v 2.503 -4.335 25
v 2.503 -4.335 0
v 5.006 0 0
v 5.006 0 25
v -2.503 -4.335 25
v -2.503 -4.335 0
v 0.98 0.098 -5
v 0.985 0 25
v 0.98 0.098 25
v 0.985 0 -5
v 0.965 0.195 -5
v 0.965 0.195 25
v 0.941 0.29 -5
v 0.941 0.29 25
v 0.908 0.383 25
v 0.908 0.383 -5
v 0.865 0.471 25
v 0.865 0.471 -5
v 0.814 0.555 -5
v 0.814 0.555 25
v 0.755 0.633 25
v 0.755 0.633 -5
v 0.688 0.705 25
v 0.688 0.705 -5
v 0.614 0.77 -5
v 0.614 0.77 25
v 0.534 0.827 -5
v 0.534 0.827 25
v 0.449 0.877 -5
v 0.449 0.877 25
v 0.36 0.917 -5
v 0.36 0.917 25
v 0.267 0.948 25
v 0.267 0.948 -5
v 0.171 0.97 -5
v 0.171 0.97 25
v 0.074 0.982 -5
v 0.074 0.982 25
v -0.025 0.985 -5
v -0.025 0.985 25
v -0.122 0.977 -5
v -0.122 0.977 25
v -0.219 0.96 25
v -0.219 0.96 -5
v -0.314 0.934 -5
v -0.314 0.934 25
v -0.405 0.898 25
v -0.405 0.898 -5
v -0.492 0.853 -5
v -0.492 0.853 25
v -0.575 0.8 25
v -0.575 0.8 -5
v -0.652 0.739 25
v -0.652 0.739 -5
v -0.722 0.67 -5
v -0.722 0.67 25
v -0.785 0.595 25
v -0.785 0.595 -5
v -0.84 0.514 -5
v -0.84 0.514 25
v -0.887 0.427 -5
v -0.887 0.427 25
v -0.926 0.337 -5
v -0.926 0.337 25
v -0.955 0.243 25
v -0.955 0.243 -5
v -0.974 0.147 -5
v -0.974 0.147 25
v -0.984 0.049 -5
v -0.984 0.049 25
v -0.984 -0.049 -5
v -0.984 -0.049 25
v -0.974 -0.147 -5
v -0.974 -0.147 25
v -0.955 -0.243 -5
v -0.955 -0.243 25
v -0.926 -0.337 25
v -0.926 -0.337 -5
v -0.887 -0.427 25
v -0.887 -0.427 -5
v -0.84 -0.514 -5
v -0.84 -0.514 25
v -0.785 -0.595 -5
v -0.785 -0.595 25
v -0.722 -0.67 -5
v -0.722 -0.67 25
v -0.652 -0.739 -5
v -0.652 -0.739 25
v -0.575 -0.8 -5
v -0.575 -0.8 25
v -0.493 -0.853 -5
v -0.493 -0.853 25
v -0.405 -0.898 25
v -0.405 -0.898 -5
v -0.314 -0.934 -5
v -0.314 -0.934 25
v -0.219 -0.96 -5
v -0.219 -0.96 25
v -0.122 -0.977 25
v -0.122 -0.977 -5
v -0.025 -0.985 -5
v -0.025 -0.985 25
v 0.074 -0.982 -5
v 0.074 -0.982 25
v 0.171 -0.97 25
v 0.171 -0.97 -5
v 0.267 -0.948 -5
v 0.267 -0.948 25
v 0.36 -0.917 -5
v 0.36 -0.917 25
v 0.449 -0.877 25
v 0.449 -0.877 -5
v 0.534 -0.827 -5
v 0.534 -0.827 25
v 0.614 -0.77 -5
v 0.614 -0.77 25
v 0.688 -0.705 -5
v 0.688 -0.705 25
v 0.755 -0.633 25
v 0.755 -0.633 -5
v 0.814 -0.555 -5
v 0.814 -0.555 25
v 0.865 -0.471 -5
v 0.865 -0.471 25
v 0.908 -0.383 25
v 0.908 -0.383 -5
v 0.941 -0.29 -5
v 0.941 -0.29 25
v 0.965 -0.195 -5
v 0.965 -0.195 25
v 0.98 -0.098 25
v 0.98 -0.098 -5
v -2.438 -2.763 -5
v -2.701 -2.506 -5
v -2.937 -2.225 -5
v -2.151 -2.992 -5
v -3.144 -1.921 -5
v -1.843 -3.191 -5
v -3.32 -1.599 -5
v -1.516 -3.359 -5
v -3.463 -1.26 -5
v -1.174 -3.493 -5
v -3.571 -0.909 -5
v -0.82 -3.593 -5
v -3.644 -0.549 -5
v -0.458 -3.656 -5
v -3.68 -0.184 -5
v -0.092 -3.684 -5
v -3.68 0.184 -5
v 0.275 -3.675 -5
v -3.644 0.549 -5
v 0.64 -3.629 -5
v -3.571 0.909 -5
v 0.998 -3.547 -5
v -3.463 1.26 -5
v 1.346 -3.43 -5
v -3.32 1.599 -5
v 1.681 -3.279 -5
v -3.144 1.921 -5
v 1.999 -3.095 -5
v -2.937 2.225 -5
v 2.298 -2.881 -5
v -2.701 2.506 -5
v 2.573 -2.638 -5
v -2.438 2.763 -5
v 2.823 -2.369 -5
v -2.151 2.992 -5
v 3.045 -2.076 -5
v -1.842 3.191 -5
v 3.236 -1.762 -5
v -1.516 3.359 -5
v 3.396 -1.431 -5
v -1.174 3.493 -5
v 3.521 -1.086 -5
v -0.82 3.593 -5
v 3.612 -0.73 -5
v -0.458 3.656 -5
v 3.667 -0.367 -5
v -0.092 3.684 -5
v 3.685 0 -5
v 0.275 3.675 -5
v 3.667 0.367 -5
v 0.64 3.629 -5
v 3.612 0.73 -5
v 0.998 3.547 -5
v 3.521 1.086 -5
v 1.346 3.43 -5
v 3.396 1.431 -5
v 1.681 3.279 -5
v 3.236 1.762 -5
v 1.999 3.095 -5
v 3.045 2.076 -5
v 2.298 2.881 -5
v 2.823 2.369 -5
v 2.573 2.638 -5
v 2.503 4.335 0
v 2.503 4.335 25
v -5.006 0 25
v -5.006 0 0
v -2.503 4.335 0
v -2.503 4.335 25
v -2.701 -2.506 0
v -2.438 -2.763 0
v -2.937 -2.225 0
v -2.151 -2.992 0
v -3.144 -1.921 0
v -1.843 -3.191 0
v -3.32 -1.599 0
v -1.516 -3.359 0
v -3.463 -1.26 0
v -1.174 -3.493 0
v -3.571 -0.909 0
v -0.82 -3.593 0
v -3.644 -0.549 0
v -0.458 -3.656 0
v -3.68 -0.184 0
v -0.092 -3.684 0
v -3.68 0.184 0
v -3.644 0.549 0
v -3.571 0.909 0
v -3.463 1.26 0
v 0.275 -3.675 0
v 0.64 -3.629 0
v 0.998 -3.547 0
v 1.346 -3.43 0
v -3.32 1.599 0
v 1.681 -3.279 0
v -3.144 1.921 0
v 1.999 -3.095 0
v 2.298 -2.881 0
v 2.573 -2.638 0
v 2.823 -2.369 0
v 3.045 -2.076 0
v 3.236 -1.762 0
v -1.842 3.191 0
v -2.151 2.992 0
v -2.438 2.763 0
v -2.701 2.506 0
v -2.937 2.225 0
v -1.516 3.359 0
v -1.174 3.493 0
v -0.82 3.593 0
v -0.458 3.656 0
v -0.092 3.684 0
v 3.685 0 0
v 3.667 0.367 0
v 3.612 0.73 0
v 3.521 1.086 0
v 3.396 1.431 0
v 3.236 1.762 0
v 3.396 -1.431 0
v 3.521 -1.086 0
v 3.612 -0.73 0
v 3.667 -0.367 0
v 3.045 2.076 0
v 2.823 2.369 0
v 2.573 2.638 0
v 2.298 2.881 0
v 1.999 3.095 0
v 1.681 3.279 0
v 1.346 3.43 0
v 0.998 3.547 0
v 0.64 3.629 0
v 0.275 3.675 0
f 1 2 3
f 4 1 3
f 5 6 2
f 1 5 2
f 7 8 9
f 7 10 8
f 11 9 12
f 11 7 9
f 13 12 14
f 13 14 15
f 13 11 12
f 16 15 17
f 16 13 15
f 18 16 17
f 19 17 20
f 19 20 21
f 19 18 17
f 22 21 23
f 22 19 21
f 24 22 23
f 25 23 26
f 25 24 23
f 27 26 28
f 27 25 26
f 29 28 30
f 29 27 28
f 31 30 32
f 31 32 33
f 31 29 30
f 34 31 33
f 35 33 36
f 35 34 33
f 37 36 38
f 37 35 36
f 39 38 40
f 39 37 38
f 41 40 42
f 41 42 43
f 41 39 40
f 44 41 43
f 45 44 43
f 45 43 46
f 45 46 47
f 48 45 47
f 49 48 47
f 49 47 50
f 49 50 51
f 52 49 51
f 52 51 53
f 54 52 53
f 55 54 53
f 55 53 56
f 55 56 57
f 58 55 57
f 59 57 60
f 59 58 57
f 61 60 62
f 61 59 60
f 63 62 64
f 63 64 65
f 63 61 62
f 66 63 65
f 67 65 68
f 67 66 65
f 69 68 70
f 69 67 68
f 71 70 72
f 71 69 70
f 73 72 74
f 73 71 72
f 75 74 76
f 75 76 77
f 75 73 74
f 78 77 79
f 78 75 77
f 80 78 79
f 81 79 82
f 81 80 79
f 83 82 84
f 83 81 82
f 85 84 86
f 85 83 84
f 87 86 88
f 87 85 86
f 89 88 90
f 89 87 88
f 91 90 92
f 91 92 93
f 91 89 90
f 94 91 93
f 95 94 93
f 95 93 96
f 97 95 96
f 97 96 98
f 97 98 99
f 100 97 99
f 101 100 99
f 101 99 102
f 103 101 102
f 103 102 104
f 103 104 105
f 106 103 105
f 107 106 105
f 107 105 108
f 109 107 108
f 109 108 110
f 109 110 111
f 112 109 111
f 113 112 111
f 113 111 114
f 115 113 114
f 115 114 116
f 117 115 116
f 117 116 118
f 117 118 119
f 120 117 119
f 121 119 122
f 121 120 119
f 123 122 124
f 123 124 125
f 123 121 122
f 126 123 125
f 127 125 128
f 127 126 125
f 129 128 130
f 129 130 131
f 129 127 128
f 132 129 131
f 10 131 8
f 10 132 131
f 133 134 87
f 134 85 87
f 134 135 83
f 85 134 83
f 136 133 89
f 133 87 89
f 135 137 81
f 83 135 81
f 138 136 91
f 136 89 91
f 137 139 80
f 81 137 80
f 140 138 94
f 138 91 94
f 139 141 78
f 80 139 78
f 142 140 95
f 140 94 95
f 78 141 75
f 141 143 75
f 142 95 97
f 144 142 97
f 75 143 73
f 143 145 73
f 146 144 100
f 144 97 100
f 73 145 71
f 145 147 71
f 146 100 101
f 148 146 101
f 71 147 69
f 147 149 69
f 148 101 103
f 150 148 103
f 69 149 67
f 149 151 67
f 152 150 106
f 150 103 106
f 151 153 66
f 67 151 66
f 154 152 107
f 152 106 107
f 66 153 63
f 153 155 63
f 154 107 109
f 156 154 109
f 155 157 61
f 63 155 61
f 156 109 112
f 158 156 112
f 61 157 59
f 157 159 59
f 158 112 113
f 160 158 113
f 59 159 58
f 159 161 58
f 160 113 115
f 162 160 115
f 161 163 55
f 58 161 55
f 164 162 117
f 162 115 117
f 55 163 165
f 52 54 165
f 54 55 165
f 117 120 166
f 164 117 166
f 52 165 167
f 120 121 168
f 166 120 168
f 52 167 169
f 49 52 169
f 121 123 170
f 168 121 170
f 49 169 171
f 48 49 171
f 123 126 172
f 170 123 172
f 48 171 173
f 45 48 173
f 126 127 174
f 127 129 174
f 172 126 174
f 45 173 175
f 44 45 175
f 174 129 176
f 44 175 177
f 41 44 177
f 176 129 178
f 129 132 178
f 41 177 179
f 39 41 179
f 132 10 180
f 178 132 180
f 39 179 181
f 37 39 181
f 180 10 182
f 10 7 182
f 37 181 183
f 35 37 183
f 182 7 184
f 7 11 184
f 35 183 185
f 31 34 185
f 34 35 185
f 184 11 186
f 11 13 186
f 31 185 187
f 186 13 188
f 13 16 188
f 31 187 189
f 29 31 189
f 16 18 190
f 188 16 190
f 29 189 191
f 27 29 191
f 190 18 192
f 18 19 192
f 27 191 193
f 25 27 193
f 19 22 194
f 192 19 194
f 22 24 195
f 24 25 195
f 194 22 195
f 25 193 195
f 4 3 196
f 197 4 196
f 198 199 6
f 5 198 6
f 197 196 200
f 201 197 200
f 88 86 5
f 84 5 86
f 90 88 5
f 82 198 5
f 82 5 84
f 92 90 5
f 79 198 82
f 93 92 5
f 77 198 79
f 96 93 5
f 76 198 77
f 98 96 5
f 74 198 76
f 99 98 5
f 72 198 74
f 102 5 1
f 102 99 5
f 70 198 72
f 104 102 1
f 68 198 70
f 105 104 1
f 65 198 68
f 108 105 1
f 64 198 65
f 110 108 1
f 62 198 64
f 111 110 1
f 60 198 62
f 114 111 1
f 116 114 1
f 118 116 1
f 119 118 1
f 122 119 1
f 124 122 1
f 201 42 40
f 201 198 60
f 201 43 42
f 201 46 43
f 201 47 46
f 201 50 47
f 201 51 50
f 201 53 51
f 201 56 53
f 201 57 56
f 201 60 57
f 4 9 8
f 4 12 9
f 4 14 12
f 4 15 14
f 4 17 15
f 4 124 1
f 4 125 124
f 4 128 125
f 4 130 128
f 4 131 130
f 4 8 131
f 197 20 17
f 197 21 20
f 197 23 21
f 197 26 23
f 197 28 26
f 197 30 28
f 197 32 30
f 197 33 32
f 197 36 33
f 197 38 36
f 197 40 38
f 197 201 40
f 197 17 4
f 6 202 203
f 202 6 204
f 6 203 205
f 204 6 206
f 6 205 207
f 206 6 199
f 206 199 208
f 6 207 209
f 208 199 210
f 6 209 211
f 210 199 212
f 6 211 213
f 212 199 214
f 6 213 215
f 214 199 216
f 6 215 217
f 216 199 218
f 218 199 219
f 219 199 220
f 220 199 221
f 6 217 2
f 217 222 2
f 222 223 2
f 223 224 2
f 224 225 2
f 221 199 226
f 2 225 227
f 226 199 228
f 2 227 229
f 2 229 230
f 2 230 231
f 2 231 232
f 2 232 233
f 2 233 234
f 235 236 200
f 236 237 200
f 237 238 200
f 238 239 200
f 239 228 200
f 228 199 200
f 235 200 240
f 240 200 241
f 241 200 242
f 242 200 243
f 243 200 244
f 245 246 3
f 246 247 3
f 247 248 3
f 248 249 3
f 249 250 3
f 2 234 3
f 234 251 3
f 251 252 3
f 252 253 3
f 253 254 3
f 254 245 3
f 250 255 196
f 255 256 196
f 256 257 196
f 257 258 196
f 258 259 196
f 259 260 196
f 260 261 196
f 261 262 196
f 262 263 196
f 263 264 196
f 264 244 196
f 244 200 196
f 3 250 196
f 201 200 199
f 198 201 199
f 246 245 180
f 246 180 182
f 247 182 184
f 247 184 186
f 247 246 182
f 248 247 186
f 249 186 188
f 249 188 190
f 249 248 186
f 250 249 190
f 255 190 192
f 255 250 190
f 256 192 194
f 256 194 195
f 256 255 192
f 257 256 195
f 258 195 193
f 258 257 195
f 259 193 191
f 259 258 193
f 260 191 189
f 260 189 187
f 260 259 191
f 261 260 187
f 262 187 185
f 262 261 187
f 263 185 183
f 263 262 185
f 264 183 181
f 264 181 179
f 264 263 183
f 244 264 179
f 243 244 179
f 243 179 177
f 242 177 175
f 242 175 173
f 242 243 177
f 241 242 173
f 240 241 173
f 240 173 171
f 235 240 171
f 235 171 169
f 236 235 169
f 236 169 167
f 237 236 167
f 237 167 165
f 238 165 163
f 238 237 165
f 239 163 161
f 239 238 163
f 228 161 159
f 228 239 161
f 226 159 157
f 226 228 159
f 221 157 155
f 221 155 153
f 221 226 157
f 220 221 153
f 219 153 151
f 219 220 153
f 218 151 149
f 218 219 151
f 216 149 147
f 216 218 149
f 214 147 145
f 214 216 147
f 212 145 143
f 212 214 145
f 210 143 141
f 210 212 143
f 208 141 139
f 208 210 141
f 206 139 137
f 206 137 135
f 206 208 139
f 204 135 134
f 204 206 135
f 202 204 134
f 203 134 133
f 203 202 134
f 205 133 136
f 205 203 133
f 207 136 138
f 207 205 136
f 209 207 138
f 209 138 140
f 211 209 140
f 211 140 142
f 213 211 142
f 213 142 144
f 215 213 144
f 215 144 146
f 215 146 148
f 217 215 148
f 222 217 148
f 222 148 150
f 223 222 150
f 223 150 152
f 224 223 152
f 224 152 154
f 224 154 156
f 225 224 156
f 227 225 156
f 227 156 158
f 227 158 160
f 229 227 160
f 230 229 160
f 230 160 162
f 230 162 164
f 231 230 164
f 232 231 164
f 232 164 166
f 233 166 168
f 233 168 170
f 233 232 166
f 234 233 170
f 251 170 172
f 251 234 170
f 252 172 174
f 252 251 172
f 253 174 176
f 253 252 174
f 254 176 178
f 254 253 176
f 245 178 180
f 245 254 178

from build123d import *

# Parameters (mm, degrees)
F0_R        = 3.685
F0_R_2      = 0.985
F1_DEPTH    = 5
F1_FACE_R   = 3.685
F1_FACE_R_2 = 0.985
F2_DEPTH    = 25


with BuildPart() as f1:
    # F0 (on Top) → F1 (new body)
    with BuildSketch(Plane.XY):
        Circle(F0_R)
        Circle(F0_R_2, mode=Mode.SUBTRACT)
    extrude(amount=-F1_DEPTH)

    # F0 (on Top) + F1_face (on face) → F2 (join)
    with BuildSketch(Plane.XY):
        Polygon((2.502813, -4.335), (5.005627, 0), (2.502813, 4.335), (-2.502813, 4.335), (-5.005627, 0), (-2.502813, -4.335), align=None)
        Circle(F0_R, mode=Mode.SUBTRACT)
    with BuildSketch(Plane.XY):
        Circle(F1_FACE_R)
        Circle(F1_FACE_R_2, mode=Mode.SUBTRACT)
    extrude(amount=F2_DEPTH)


solid = f1.part
